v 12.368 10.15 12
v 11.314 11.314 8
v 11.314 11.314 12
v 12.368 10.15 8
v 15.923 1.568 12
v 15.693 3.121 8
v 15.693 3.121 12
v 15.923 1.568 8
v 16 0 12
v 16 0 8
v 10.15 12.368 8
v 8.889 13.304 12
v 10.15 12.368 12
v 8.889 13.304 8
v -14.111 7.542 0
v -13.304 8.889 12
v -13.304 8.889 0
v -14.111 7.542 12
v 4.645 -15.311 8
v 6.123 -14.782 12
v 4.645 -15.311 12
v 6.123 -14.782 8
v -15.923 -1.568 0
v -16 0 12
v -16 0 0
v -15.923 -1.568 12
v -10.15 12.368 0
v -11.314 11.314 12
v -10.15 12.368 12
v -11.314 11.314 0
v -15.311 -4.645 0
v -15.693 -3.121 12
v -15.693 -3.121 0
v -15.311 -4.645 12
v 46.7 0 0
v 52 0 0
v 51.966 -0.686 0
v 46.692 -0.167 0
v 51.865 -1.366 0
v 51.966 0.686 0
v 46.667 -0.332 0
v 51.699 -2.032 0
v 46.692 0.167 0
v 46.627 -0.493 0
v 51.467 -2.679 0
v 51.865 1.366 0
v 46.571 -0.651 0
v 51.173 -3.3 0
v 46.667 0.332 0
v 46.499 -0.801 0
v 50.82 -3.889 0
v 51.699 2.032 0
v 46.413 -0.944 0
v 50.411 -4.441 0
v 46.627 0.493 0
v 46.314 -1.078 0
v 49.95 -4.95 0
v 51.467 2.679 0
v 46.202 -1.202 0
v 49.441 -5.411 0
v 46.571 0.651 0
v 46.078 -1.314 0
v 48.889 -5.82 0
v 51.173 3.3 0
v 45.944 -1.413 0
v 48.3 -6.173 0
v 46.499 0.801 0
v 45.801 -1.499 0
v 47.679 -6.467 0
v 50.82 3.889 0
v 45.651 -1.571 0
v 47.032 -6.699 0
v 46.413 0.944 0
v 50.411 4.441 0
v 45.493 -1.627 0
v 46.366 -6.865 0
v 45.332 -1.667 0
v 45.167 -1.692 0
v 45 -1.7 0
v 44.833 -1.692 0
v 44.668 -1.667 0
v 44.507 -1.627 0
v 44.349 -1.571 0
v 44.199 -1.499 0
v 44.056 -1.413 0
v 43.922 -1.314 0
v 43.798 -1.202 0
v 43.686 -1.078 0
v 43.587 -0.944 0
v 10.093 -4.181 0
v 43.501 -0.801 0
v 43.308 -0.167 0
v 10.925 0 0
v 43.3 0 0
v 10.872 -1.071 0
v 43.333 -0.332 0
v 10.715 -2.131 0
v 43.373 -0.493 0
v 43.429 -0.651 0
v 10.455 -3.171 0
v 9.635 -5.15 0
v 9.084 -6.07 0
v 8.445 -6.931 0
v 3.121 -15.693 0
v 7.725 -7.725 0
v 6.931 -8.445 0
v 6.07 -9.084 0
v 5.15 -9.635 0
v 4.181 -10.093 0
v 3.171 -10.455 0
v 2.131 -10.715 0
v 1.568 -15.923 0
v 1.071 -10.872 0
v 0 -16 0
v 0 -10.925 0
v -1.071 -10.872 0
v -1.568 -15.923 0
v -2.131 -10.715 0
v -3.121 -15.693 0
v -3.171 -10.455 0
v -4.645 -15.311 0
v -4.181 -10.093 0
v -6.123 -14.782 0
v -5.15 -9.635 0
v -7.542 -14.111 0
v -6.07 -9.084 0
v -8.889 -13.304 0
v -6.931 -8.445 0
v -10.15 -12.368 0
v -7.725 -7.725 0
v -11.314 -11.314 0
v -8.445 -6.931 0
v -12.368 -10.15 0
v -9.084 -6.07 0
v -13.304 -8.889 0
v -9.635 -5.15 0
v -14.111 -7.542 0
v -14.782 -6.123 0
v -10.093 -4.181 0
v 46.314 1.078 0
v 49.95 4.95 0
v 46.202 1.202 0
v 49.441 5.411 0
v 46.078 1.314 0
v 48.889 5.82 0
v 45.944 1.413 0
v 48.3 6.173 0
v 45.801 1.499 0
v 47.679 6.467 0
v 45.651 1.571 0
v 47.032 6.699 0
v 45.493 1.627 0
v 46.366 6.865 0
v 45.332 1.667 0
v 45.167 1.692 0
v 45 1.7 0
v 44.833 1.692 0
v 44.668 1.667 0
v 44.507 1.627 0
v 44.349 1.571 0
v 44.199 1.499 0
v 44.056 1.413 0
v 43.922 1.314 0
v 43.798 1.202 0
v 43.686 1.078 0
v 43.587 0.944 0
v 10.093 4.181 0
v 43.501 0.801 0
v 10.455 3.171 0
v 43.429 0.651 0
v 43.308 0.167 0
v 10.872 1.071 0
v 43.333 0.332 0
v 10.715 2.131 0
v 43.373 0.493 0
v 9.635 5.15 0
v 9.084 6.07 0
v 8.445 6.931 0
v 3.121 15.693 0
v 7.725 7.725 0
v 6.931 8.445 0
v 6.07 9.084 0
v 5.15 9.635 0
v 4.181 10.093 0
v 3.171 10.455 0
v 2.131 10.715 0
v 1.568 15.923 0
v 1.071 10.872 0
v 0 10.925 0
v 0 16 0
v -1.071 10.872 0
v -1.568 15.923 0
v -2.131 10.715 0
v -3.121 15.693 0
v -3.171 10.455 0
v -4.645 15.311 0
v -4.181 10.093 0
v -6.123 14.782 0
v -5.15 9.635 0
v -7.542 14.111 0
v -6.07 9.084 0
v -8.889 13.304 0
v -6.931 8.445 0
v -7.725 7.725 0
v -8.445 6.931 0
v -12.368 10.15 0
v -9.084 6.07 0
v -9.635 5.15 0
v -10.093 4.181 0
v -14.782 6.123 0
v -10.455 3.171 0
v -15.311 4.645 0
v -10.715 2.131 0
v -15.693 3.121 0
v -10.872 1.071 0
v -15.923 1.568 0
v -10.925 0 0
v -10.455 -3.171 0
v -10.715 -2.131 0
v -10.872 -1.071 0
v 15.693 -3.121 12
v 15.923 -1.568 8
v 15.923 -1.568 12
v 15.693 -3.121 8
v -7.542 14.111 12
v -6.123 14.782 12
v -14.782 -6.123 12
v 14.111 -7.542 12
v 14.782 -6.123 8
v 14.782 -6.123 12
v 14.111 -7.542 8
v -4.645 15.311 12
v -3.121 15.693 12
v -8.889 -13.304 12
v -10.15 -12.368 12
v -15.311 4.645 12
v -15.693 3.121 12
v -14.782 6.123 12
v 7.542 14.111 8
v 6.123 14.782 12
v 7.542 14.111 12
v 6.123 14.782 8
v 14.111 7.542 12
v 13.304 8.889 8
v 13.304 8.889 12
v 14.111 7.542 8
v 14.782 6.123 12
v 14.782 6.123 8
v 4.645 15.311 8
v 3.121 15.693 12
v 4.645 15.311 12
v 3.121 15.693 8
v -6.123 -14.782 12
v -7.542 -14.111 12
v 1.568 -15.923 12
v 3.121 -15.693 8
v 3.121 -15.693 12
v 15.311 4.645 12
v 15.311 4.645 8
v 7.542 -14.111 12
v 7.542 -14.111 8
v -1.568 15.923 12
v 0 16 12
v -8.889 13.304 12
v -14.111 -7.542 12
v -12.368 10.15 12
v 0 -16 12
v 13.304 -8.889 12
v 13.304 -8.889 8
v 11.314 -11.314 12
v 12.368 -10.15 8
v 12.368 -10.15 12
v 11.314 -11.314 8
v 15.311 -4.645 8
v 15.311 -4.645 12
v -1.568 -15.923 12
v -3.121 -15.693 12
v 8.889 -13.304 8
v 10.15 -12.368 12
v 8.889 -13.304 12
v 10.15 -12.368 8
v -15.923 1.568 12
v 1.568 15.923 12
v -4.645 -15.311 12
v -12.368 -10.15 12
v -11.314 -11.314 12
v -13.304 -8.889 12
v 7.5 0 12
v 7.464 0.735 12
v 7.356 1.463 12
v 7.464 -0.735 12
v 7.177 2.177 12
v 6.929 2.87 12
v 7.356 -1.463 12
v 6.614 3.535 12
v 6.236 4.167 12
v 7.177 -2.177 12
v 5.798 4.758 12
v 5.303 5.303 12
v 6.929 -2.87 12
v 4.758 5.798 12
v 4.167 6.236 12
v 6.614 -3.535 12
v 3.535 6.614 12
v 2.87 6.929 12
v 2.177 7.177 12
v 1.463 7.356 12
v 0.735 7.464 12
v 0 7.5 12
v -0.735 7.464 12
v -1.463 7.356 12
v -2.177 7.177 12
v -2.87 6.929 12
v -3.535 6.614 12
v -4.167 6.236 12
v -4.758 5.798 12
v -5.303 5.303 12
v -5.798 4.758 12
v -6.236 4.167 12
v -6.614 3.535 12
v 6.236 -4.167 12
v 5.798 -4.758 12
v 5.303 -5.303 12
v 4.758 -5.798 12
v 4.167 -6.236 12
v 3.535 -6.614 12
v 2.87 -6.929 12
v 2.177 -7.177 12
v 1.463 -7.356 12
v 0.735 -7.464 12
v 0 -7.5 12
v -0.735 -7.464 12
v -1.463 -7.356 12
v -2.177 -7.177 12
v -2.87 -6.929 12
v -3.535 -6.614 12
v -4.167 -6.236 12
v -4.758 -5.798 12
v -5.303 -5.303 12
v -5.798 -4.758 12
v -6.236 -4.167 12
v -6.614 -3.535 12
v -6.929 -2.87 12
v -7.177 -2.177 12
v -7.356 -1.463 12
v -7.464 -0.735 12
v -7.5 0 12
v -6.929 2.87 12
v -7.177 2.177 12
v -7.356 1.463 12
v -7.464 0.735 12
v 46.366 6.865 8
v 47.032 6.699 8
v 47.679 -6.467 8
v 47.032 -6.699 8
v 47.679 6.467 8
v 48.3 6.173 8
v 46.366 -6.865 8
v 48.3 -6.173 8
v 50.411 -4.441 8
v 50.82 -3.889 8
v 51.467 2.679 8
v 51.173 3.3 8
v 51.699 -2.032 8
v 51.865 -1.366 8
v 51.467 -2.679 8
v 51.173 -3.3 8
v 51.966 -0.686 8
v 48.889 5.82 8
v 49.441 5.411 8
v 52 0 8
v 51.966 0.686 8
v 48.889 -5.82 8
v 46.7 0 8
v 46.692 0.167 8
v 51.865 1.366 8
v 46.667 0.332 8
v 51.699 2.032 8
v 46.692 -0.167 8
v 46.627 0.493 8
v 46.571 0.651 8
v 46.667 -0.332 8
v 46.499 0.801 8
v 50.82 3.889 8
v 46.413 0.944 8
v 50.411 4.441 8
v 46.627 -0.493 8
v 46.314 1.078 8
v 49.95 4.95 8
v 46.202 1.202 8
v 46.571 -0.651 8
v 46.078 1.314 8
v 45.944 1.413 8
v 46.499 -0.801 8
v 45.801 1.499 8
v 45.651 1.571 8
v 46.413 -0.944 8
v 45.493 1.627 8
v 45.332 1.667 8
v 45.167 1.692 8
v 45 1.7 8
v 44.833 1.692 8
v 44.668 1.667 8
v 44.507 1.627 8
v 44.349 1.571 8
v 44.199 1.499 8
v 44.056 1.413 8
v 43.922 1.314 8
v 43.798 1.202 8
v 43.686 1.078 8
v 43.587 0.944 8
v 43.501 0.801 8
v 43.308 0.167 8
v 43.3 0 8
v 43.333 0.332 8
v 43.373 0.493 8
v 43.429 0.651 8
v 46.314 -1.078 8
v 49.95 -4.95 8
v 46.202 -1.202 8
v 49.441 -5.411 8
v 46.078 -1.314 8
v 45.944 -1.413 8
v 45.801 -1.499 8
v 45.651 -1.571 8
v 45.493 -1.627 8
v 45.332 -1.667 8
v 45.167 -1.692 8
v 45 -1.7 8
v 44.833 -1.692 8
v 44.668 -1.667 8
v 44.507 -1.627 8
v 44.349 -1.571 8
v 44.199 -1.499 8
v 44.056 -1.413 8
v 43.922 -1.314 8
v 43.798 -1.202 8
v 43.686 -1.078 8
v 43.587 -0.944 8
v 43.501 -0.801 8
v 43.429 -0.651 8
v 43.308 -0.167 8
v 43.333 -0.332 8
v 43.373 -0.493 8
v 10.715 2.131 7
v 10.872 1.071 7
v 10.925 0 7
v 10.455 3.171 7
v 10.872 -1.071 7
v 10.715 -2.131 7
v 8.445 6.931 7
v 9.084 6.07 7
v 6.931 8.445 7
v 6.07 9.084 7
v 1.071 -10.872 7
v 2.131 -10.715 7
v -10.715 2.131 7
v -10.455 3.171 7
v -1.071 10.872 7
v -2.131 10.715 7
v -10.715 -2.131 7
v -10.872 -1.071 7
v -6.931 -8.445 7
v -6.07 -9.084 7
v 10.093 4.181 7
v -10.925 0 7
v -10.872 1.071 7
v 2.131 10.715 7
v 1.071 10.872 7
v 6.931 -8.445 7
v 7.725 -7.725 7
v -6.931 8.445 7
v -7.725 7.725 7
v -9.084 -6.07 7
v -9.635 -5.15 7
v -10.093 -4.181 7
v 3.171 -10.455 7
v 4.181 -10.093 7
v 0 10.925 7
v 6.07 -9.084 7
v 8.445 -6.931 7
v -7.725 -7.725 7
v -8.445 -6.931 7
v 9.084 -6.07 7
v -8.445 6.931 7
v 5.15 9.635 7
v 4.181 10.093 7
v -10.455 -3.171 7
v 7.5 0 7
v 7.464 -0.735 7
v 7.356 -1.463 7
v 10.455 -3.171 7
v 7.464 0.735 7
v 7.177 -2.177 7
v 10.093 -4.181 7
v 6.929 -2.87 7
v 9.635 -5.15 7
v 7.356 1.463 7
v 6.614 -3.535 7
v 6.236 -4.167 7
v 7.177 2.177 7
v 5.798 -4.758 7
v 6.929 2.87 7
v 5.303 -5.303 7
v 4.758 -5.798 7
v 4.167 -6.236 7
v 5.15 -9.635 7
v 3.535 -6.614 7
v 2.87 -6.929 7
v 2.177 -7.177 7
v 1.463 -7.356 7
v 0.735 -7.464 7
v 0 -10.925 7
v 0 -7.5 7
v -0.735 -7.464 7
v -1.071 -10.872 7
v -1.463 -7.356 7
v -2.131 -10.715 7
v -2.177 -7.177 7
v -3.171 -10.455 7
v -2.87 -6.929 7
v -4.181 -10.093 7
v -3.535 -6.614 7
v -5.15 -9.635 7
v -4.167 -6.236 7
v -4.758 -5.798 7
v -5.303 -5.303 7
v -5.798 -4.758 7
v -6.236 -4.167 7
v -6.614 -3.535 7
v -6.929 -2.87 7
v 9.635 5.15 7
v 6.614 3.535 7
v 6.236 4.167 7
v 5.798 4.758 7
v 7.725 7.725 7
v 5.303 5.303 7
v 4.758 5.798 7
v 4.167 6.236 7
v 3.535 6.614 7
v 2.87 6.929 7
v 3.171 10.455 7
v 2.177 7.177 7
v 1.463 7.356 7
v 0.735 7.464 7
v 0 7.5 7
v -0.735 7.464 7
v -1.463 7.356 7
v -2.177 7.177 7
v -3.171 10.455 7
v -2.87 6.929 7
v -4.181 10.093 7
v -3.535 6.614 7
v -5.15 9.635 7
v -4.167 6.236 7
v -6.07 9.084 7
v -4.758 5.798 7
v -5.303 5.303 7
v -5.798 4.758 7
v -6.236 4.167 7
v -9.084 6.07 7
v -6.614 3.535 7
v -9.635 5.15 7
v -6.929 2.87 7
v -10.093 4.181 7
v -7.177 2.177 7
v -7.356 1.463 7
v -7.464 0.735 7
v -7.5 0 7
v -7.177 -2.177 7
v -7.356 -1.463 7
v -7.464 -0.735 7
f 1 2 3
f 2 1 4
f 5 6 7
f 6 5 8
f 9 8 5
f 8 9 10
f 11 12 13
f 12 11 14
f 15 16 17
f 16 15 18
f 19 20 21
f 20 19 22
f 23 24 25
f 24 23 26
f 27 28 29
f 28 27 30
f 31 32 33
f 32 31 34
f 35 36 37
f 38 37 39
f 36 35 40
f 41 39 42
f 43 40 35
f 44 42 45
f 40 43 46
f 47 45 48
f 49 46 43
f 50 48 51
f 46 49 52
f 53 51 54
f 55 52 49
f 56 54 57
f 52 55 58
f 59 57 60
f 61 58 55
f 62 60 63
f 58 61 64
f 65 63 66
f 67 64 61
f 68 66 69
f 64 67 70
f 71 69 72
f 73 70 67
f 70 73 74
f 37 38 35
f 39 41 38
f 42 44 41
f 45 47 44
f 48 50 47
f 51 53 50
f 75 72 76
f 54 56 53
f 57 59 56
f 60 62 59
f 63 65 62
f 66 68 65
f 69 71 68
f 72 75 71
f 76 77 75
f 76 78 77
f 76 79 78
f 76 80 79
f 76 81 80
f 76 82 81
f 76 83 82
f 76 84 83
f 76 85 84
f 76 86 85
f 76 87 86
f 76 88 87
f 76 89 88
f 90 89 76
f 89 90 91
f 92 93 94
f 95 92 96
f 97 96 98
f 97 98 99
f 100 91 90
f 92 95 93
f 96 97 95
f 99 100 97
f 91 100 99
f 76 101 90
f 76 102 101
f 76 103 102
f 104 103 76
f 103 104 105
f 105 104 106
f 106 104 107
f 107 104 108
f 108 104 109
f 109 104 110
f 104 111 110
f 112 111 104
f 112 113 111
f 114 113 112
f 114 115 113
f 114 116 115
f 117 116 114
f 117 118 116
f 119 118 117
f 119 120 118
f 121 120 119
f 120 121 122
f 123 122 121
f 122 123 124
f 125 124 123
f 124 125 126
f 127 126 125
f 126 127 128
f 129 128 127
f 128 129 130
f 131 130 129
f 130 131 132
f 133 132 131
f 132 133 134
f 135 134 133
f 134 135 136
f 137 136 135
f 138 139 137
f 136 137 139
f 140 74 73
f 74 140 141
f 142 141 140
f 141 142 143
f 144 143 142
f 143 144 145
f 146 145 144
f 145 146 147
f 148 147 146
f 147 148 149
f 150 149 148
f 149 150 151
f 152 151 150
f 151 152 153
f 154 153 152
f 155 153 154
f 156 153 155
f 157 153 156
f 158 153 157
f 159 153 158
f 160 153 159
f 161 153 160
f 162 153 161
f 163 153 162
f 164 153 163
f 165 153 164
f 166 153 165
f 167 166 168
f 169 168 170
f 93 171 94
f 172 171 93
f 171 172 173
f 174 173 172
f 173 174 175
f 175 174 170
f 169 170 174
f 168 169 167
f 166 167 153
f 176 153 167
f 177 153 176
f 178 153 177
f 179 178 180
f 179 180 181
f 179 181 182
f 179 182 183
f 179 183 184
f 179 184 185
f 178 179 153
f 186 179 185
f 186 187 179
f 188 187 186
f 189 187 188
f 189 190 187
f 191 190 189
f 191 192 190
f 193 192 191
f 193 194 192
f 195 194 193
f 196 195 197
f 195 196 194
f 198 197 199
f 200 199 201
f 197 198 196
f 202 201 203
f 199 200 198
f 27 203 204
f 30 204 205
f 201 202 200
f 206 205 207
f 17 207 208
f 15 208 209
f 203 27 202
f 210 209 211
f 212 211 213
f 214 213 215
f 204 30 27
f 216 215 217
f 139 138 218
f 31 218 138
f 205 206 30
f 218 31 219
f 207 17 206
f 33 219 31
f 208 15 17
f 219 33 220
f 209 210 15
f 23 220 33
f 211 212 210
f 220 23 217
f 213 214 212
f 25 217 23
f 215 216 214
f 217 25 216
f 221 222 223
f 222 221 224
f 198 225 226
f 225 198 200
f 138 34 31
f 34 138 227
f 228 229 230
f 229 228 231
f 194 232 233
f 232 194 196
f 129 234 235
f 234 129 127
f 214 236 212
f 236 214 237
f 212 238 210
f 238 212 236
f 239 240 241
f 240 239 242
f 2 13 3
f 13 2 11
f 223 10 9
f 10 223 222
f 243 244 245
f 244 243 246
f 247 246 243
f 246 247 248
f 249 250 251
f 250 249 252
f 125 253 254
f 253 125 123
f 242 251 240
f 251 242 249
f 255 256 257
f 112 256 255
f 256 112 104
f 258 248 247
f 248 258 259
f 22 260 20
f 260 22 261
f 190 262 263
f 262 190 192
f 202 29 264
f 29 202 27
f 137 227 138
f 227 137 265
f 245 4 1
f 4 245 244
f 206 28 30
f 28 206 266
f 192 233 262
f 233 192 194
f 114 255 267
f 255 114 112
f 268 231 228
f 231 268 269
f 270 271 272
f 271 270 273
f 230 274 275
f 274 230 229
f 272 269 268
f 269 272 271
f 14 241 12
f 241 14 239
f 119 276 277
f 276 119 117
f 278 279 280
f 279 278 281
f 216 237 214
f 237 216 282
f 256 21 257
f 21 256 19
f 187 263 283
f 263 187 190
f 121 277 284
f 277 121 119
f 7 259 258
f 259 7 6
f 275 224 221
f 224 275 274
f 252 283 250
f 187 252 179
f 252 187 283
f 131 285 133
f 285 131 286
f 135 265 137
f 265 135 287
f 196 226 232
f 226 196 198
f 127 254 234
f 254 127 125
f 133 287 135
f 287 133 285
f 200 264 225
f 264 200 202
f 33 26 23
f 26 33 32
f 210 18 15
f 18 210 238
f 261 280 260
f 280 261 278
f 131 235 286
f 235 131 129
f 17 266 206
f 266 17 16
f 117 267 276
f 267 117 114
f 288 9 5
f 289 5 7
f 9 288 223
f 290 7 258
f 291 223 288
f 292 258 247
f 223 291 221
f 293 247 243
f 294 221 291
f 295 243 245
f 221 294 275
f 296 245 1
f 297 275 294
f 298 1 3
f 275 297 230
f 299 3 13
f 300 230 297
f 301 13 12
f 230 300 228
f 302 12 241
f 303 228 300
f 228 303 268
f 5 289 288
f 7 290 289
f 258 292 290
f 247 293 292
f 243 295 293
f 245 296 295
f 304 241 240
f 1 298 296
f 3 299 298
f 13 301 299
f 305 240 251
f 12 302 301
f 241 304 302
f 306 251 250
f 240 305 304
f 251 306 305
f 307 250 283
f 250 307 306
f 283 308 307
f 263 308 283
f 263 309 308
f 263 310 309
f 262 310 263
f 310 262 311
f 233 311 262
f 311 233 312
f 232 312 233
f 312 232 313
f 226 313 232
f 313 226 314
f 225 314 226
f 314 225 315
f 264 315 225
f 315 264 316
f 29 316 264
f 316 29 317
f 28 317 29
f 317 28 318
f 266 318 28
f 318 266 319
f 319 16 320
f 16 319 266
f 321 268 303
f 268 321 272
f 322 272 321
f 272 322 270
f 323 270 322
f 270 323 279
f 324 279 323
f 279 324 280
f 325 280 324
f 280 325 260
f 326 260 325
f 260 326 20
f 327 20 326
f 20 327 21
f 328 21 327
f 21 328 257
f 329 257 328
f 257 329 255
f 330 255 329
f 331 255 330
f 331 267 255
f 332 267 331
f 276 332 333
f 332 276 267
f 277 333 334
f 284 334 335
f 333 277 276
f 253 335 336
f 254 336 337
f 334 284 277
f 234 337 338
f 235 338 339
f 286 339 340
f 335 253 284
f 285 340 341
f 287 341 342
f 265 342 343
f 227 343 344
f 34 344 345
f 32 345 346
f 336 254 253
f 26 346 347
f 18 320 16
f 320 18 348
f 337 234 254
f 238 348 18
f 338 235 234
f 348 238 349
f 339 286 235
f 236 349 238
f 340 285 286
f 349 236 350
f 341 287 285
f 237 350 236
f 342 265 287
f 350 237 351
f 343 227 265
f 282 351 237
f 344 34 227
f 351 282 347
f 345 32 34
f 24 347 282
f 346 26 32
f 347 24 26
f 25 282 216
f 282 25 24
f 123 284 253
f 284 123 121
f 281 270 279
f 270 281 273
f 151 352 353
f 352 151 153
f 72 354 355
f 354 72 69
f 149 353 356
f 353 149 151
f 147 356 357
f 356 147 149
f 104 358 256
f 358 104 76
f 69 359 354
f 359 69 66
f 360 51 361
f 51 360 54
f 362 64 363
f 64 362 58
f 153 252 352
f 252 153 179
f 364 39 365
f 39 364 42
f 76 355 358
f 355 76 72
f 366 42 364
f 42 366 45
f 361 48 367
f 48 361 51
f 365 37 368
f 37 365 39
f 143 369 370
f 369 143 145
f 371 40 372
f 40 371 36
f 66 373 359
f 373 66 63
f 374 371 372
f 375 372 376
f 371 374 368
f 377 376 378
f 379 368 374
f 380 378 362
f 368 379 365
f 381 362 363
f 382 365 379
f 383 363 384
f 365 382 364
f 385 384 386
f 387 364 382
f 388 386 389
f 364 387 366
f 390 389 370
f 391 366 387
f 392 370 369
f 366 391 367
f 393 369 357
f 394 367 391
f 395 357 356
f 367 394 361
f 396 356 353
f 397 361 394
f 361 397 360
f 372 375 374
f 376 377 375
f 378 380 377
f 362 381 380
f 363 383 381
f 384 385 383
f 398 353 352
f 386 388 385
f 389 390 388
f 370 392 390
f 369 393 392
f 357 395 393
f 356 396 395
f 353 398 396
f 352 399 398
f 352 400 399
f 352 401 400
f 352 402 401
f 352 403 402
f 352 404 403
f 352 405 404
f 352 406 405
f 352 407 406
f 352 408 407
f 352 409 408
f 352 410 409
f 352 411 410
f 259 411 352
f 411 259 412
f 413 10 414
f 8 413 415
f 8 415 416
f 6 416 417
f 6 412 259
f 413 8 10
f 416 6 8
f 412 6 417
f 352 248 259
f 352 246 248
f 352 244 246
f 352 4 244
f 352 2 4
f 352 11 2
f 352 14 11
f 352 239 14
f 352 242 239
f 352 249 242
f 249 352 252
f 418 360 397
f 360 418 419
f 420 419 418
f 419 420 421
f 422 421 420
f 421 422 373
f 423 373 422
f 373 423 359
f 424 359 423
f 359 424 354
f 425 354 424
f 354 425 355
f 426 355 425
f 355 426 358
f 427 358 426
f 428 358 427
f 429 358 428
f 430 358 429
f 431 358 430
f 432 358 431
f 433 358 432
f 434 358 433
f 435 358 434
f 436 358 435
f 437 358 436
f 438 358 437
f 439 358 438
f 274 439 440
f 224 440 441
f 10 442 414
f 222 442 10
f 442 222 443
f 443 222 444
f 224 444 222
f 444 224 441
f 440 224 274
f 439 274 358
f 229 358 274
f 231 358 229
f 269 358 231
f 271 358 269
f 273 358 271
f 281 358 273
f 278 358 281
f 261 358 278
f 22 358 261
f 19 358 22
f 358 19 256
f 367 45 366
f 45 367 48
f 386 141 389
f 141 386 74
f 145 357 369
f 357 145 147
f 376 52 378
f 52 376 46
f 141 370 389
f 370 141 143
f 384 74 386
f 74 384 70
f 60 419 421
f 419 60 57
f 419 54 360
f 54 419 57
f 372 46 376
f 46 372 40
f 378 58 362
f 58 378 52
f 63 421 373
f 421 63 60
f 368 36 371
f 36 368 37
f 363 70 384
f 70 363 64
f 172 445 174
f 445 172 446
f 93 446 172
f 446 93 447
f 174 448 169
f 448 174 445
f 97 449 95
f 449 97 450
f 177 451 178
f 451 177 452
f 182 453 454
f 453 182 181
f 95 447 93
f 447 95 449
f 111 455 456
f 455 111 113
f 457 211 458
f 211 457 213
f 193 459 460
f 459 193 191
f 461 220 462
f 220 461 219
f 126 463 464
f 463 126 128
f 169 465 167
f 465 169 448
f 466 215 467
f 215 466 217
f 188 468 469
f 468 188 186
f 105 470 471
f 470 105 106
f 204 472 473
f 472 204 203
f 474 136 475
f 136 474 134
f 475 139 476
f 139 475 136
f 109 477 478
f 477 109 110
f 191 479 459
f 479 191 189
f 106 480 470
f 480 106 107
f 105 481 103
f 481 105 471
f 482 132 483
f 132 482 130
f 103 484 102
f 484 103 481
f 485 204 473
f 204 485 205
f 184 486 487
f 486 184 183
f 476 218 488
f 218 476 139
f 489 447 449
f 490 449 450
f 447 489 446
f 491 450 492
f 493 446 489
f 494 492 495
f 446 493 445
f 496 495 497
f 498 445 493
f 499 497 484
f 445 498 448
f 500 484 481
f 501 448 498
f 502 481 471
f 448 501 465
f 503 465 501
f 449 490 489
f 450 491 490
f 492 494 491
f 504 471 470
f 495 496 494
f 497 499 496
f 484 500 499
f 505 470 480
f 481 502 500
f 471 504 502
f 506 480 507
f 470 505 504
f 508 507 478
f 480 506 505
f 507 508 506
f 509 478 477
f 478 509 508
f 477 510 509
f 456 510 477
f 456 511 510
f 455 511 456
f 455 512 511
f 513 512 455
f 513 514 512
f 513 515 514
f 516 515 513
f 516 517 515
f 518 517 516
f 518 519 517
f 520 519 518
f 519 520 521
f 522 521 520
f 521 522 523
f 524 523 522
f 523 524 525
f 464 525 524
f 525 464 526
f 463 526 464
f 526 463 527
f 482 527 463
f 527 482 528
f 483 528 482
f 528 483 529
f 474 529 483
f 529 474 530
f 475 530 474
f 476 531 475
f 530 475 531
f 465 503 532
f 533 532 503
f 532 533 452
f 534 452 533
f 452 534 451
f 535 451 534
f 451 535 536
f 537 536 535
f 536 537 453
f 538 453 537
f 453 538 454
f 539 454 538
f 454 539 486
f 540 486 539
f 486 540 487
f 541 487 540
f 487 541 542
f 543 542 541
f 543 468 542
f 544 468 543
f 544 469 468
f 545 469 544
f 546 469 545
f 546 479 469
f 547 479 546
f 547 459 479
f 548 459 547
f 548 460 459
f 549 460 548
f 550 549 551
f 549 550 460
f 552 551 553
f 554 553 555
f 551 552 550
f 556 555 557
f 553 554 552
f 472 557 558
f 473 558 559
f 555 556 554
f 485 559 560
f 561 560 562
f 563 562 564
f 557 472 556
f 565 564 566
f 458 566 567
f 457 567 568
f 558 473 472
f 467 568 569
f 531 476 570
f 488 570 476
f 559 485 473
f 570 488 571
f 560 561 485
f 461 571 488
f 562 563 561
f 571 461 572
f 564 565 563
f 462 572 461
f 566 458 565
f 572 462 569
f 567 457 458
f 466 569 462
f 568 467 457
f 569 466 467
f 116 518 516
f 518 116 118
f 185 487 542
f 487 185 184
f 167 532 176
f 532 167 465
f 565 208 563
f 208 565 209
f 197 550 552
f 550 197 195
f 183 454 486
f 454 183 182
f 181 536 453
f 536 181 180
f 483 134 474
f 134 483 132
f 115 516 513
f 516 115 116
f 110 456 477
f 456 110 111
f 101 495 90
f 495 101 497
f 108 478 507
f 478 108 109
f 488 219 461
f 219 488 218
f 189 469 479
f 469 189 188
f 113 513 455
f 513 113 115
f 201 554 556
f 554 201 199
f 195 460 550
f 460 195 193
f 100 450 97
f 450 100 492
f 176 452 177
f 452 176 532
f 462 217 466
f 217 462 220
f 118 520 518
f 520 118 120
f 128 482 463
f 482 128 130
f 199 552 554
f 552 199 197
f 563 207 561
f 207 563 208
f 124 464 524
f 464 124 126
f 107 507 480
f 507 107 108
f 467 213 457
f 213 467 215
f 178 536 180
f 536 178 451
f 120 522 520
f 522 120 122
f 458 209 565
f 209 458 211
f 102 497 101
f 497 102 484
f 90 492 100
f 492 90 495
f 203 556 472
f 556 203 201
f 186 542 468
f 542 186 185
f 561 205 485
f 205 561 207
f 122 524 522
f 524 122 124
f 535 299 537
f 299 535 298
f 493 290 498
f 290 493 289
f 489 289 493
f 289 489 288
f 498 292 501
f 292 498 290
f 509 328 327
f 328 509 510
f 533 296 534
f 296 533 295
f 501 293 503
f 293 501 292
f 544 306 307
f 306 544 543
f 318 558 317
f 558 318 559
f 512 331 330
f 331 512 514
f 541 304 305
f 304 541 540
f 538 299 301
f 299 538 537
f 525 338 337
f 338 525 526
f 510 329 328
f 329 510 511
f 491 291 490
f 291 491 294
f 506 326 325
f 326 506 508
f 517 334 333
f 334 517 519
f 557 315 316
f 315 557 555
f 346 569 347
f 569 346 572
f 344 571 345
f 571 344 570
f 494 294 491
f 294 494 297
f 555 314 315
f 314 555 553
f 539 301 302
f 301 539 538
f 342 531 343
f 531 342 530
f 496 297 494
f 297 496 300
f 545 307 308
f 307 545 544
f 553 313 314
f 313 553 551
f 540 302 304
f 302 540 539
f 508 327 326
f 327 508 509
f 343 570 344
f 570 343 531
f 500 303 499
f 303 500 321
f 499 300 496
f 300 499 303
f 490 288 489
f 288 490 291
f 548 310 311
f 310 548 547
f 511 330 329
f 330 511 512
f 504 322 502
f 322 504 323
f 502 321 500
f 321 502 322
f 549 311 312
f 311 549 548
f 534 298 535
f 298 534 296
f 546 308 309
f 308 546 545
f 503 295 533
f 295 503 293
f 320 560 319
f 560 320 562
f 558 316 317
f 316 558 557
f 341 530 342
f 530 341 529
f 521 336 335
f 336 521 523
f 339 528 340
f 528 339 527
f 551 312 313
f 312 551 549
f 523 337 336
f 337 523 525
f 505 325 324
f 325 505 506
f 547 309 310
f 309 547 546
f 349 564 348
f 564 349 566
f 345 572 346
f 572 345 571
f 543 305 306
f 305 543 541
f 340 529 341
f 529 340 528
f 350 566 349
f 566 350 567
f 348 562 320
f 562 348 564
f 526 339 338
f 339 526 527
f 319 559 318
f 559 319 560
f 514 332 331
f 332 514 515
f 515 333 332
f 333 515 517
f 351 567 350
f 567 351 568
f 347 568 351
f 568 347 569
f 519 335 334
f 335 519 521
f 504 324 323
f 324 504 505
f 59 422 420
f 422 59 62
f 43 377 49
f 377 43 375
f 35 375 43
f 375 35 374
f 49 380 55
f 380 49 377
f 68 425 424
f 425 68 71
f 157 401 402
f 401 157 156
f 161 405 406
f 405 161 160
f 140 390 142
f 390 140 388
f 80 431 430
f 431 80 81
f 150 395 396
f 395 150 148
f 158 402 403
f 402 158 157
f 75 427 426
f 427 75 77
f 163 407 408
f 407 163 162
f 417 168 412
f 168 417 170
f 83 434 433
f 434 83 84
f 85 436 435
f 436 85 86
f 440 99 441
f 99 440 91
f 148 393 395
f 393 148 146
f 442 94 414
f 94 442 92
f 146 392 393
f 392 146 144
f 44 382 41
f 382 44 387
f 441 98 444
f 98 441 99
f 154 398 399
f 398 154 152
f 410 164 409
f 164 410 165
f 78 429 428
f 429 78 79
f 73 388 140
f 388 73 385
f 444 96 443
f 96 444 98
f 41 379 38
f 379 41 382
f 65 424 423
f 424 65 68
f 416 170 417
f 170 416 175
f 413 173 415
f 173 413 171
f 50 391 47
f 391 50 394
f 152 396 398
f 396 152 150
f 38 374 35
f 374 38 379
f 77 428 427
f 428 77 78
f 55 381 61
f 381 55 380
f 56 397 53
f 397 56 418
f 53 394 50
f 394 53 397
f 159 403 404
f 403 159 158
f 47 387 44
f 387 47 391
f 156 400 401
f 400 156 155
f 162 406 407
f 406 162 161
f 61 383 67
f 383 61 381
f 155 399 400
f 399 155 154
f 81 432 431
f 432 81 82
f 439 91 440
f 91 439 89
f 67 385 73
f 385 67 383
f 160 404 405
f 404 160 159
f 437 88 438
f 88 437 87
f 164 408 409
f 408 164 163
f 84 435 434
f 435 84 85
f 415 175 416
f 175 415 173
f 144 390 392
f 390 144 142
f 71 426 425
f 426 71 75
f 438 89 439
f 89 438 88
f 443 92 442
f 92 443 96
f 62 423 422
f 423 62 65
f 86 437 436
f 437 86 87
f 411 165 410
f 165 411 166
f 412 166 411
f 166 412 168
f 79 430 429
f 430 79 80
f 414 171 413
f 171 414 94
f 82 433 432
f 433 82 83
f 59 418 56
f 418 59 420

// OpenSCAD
// file: ../lib/utils.scad
// 공통 모듈 (common modules) — 베어링 시트, 볼트 홀 등
include <../config/parameters.scad>

// 베어링 시트 (bearing seat): 압입 공차 적용 포켓
// brg = [내경, 외경, 폭] (예: BRG_608ZZ)
module bearing_seat(brg) {
    cylinder(d = brg[1] + bearing_press_fit, h = brg[2]);
}

// 베어링 시트 + 내륜 도피 홀 (관통)
// wall = 시트 아래 받침 두께
module bearing_pocket(brg, wall = 2) {
    union() {
        translate([0, 0, wall]) bearing_seat(brg);
        // 내륜 접촉 방지: 내경보다 크고 외경보다 작은 도피 홀
        cylinder(d = (brg[0] + brg[1]) / 2, h = wall + 0.1);
    }
}

// 관통 볼트 홀 (clearance hole)
module bolt_hole(d, h) {
    cylinder(d = d + bolt_hole_oversize, h = h);
}

// NEMA 17 모터 마운트 홀 패턴 (CON-004: SF24 = 42각 NEMA 17 호환)
// h = 판 두께
module nema17_mount(h) {
    union() {
        cylinder(d = nema17_pilot_d + clearance_fit, h = h);
        for (x = [-1, 1], y = [-1, 1])
            translate([x * nema17_hole_pitch / 2, y * nema17_hole_pitch / 2, 0])
                bolt_hole(nema17_bolt_d, h);
    }
}

// 숄더 볼트 피벗 홀 (CON-001)
// d = 숄더 직경 (shoulder_d_small | shoulder_d_large)
module pivot_hole(d, h) {
    cylinder(d = d + clearance_fit, h = h);
}

// 베어링 보스 (bearing boss): 출력물 허브에 베어링 내경 직접 안착 (CON-003)
// 내경 기준 압입 — bearing_press_fit(음수)만큼 키운다
module bearing_boss(brg, h) {
    cylinder(d = brg[0] - bearing_press_fit, h = h);
}

// 육각 너트 포켓 (nut pocket) — 차집합용. af = 평면폭(across flats)
module nut_pocket(af, t) {
    cylinder(d = (af + clearance_fit) / cos(30), h = t, $fn = 6);
}

// 리미트 스위치 장착 홀 쌍 (ELE-004) — 차집합용, X축 방향 피치
module ls_mount_holes(h) {
    for (x = [-1, 1])
        translate([x * ls_hole_pitch / 2, 0, 0])
            cylinder(d = ls_hole_d, h = h);
}

// 케이블 가이드 클립 (ELE-005) — 외면 부착형 C-클립, cable_d 다발 직경
module cable_clip(cable_d = 8, t = 4) {
    wall = 2.5;
    difference() {
        cylinder(d = cable_d + 2 * wall, h = t);
        translate([0, 0, -0.1]) cylinder(d = cable_d, h = t + 0.2);
        // 삽입 개구 (개구 폭 = 케이블 직경의 70%)
        translate([0, -cable_d * 0.35, -0.1])
            cube([cable_d, cable_d * 0.7, t + 0.2]);
    }
}

// 평행/구동 링크 바 (625ZZ 양단, MEC-002/MEC-001a)
// len = 피벗 간 거리. 보스 상면에서 베어링 압입, 하면 내륜 도피 홀.
module link_bar(len) {
    boss_t = BRG_625ZZ[2] + 4;
    difference() {
        union() {
            translate([0, -link_bar_w / 2, (boss_t - link_bar_t) / 2])
                cube([len, link_bar_w, link_bar_t]);
            for (x = [0, len])
                translate([x, 0, 0]) cylinder(d = link_boss_d, h = boss_t);
        }
        for (x = [0, len]) {
            translate([x, 0, boss_t - BRG_625ZZ[2]])
                bearing_seat([BRG_625ZZ[0], BRG_625ZZ[1], BRG_625ZZ[2] + 0.1]);
            translate([x, 0, -0.1])
                cylinder(d = (BRG_625ZZ[0] + BRG_625ZZ[1]) / 2, h = boss_t + 0.2);
        }
    }
}

// 지시선(leader) + 빌보드(billboard) 라벨 — 프리뷰용, $vpr 카메라 추종
// p = 앵커(부품 측), v = 지시선 벡터 (라벨은 p+v 위치)
// 주의: 상위 프레임이 회전된 경우 빌보드가 카메라를 향하지 않음 — 월드 프레임에서 호출할 것
module leader_label(p, v, txt, size = 3.2, col = "white") {
    color(col) {
        hull() {
            translate(p) sphere(d = 1.4, $fn = 12);
            translate(p + v) sphere(d = 1.4, $fn = 12);
        }
        translate(p + v) rotate($vpr) translate([2, -size / 2, 0])
            linear_extrude(0.6) text(txt, size = size);
    }
}

// 축 클램프 슬릿 + M3 핀치 볼트 (차집합용)
// bore_d = 클램프 보어, depth = 보어 깊이, body_d = 보스 외경
module shaft_clamp_cut(bore_d, depth, body_d) {
    union() {
        cylinder(d = bore_d + clearance_fit / 2, h = depth);
        // 슬릿
        translate([-1, 0, -0.1]) cube([2, body_d / 2 + 1, depth + 0.1]);
        // M3 핀치 볼트 (슬릿 직교) — 보어 반경과 보스 반경 사이
        translate([0, (bore_d / 2 + body_d / 2) / 2 + 1, depth / 2])
            rotate([0, 90, 0])
                translate([0, 0, -body_d / 2 - 1])
                    bolt_hole(3, body_d + 2);
    }
}
// file: ../config/parameters.scad
// cobot-lite 전역 파라미터 (global parameters)
// 모든 부품 치수는 이 파일에서만 정의한다 — 매직 넘버 하드코딩 금지 (MEC-008)

/* ===== 출력/렌더링 ===== */
$fn = 64;

/* ===== 공통 가공 여유 (파생 치수에서 참조 — 선행 정의 필수) ===== */
clearance_fit = 0.3;      // 회전/슬라이드 끼움 여유
bolt_hole_oversize = 0.4; // 관통 볼트 홀 여유

/* ===== 베어링 (bearing) — CON-002: 이 4종만 사용 =====
   [내경, 외경, 폭] mm */
BRG_608ZZ  = [8,  22, 7];   // 관절 피벗 (8mm 숄더 볼트)
BRG_625ZZ  = [5,  16, 5];   // 평행 링크 피벗 (5mm 숄더 볼트)
BRG_6805ZZ = [25, 37, 7];   // 손목 롤 축, 중구경 허브
BRG_6810ZZ = [50, 65, 7];   // 베이스 턴테이블 메인 베어링

// 베어링 압입 공차 (press-fit tolerance) — MFG-002
// 외경 기준 -0.1 ~ -0.2mm. 프린터별 보정은 이 변수 하나로 조정한다.
bearing_press_fit = -0.15;

/* ===== 숄더 볼트 (stripper/shoulder bolt) — CON-001 ===== */
shoulder_d_small = 5;   // 625ZZ 결합
shoulder_d_large = 8;   // 608ZZ 결합

/* ===== 링크 길이 — MEC-006 [TBD-4] =====
   리치 500mm 잠정. 비대칭 분할 (J2 자중 부담 보상, MEC-001a 분담 구조) */
L1 = 225;   // 상완 (upper arm): J2 축 → J3 축
L2 = 275;   // 하완 (forearm): J3 축 → 공구 플랜지

/* ===== 링크 꺾임 (팔레타이저식 구조 오프셋) =====
   관절 축 좌표는 불변(직선 L1/L2 기준) — 꺾임은 빔 형상만 변경.
   목적: ① 신장/접힘 한계 자세에서 빔-빔 간섭 여유 확보
        ② 구조 외곽을 축선 위로 올려 저자세 작업 시 팔꿈치 하부 돌출 감소
   니(knee) 수직 오프셋 h = L·pos·(1-pos)·tan(deg) */
ua_bend_deg = 12;     // 상완 꺾임각 (0 = 직선)
ua_bend_pos = 0.68;   // 꺾임 위치 (0~1, J2 기준) — 분할 조인트(95~131) 뒤
fa_bend_deg = 12;     // 하완 꺾임각
fa_bend_pos = 0.5;    // 꺾임 위치 (팔꿈치 기준)

/* ===== 가동 엔벨로프 (소프트 리미트 권고값 — docs/design-notes.md) =====
   접힘각 = J3 - J2 (월드 피치 차).
   -90° = 평행사변형 구동 전동각(transmission angle) 특이점 (크랭크∥링크),
     0° = 완전 신장 특이점 (J2·J3·손목 일직선). 양쪽 모두 운용 금지 */
env_fold_min = -75;   // 접힘 한계 (전동각 sin25° ≈ 0.42 이상 확보)
env_fold_max = -3;    // 신장 한계 (리치 ≈ 499.5mm — 공칭 500 대비 -0.5)

// J3 모터 후방 배치 연장 길이 (MEC-001c)
// J2 액추에이터는 J2 축 동축 직결 (MEC-001b) — 후방 배치 대상은 J3 어셈블리만
// J1 회전 시 베이스·작업물 간섭 확인 필수
rear_extension = 80;    // J2 피벗 → J3 모터+기어박스 어셈블리 중심 [잠정]

/* ===== 턴테이블 (turntable) — MEC-003 ===== */
turntable_bearing_gap = 30;   // 6810ZZ 2개 축방향 이격, 30mm 이상 (SHOULD)

/* ===== 모터 (motor) — CON-004: 산요덴키 SF24 시리즈 =====
   NEMA 17 호환 42각 */
motor_frame = 42;             // 프레임 폭 (mm)
nema17_hole_pitch = 31;       // 고정 볼트 피치
nema17_pilot_d = 22;          // 센터 파일럿 직경
nema17_bolt_d = 3;            // M3

/* ===== 감속비 (gear ratio) — CON-005: 5/10/20만 허용 ===== */
// 주의: MG17-G10(10:1)은 허용 토크 5N·m로 급락 — 변경 시 토크 재검증 (docs/torque-budget.md)
ratio_J1 = 20;
ratio_J2 = 20;
ratio_J3 = 20;   // SF2423 + 20:1 확정 (TBD-3 해결)
ratio_J4 = 5;

/* ===== 기어박스 (gearbox) — MG17 데이터시트 (docs/tbd-research.md TBD-5) ===== */
gbx_frame = 42;            // NEMA 17 플랜지, 모터와 동일 42각
gbx_len_20to1 = 51;        // MG17-G20 길이 (J1~J3)
gbx_len_5to1  = 40;        // MG17-G5 길이 (J4)
gbx_out_shaft_d = 8;       // 출력축 직경
gbx_in_insert = 9.5;       // 입력 결합 깊이 — SF24 축 길이 호환 확인 항목
gbx_mass_20to1 = 400;      // g — 질량 예산 계산용
gbx_mass_5to1  = 350;      // g

/* ===== 모터 몸체 치수 — SF24 카탈로그 일반값 [잠정: 구매 데이터시트로 확인] ===== */
motor_len_SF2424 = 47;    // J1, J2
motor_len_SF2423 = 39;    // J3
motor_len_SF2422 = 33;    // J4
motor_shaft_d = 5;        // SF24 출력축 (MG17 입력 클램프 ⌀5)
gbx_out_shaft_len = 20;   // MG17 출력축 돌출 길이

/* ===== 베이스/J1 (MEC-003, MEC-005) ===== */
base_plate_size = 140;    // 정사각 베이스 플레이트 한 변
base_plate_t = 8;
base_bolt_d = 5;          // M5 ×4 작업대 고정 (MEC-005)
base_bolt_pitch = 120;    // 고정 볼트 피치
base_col_wall = 5;        // 턴테이블 칼럼 벽 두께
col_window_w = 50;        // 칼럼 측면 배선/조립 창 폭
turntable_top_d = 100;    // 턴테이블 상판 직경
turntable_top_t = 8;
j1_actuator_gap = 4;      // 베이스 플레이트 상면 → 모터 하면 여유
col_open_h = 24;          // 모터 플로어 상면 → 하부 베어링 (스템 결합·셋스크류 존)
j1_stem_d = 20;           // 턴테이블 허브 스템(출력축 결합부) 외경
set_screw_pilot_d = 3.4;  // M4 무두 볼트(set screw) 셀프태핑 파일럿
m3_tap_d = 2.8;           // M3 셀프태핑 파일럿 (앵커 등 소형 체결)
shoulder_mount_px = 80;   // 어깨 텅 ↔ 턴테이블 볼트 피치 X
shoulder_mount_py = 50;   // 어깨 텅 ↔ 턴테이블 볼트 피치 Y
shoulder_mount_bolt_d = 5;// M5 ×4
shoulder_tongue_x = 40;   // 어깨 텅 깊이(X) — 포크 내 스윕 간섭 한계 결정 (J2 ≈ ±55°)

/* ===== 암 단면/관절 (MEC-004) — v0.13 플레이트 아키텍처 =====
   원칙: 출력물은 평판(plate)만. 간격은 표준 스페이서 튜브 + 관통 볼트가
   결정 (일체 보스·웹·박스 금지). 관절 베어링은 플레이트에 직접 압입 —
   플레이트 두께 = 608ZZ 폭(7) */
arm_plate_t = 7;          // 측판 두께 = 608ZZ 폭 (베어링 인-플레이트 압입)
fork_standoff_len = 30;   // 표준 육각 스탠드오프 길이 (어깨 포크 갭 = 하완 내폭)
hex_standoff_af = 13;     // 두꺼운 육각 스탠드오프 평면폭 (M6 암-암)
joint_spacer_od = 12;     // 관절 스택 스페이서 튜브 외경 (숄더 ⌀8 위)
ua_split_x = 115;         // 상완 플레이트 분할선 (365 > 빌드 대각 한계)
ua_splice = [99, 131];    // 스플라이스 더블러 볼트 X 위치 (분할선 ±16)
// 어깨 텅(플레이트 스택) 폭 = 플레이트 14 ×2 + 표준 스탠드오프 30 (v0.13)
tongue_w = 28 + fork_standoff_len;          // 58
// 상완 포크 내폭 = 표준 육각 스탠드오프 L60 (전 스탠드오프 표준화 — v0.14).
// 텅 58과의 편차 1mm/측은 J2 스택 M8 와셔가 흡수 (CON-001 와셔 기존 품목)
arm_inner_w = 60;
arm_h = 50;               // 암 단면 높이
j2_axis_h = 90;           // 턴테이블 상면 → J2 축 높이
                          // — J2 +45° 시 후방 러그 하단 ↔ 어깨 플랜지 간섭 회피 (간섭 검사 확인)
j3_crank_len = 40;        // J3 크랭크 = 하완 혼 반경 (평행사변형 1:1)
pl_offset = 45;           // 수동 평행사변형(MEC-002) 피벗 오프셋
                          // — J2 모터 42각 코너 스윕 반경(≈30) + 여유
forearm_inner_w = fork_standoff_len;  // 하완 측판 내폭 = 표준 스탠드오프 30 (v0.13)
beam_w = 40;              // 상완/하완 중앙 보(beam) 폭
arm_lug_r = 26;           // 관절 러그(피벗 보스) 반경 — NEMA17 볼트 코너(r≈21.9) + 벽
beam_wall = 4;            // 보 쉘 벽 두께 (경량화)
pivot_engage = 14;        // 축 클램프/베어링 물림 깊이
crank_t = 8;              // J3 크랭크 암 두께
crank_hub_d = 20;         // 크랭크 허브 외경
crank_hub_w = 12;         // 크랭크 허브 폭
dl_offset = 8;            // 구동 링크 평면: 플레이트 A 외면 → 링크 중심 거리
ua_joint_x = 95;          // 상완 분할 조인트 위치 (MFG-004: 365mm > 빌드 대각 한계)
ua_lap = 36;              // 랩 조인트(소켓-테논) 물림 길이

/* ===== 너트 평면폭 (across flats) ===== */
m3_nut_af = 5.5;
m4_nut_af = 7;
m6_nut_af = 10;
link_bar_w = 12;          // 링크 바 단면 폭
link_bar_t = 6;           // 링크 바 단면 두께
link_boss_d = 24;         // 링크 단부 625ZZ 보스 외경 (625 외경 16 + 벽 4×2)

/* ===== 손목/공구 플랜지 (GEN-004) ===== */
wrist_offset = 50;        // 손목 피치 피벗 → J4(플랜지) 축 수평 오프셋
                          // — J4 모터 몸체 ↔ 하완 러그 스윕 간섭 회피 (≥ lug_r + 모터 반폭)
forearm_len = L2 - wrist_offset; // 팔꿈치 축 → 손목 피치 피벗
wrist_wall = 5;           // 손목 하우징 벽 두께
flange_d = 45;            // 공구 플랜지 직경
flange_t = 8;
flange_bc = 32;           // 그리퍼 볼트 서클
flange_bolt_d = 4;        // M4 ×4

/* ===== 리미트 스위치 (ELE-004) — KW12형 기계식 마이크로 기준품 ===== */
ls_body = [20, 10, 6.5];  // 몸체 [길이, 높이, 두께]
ls_hole_pitch = 9.5;      // 장착 홀 피치
ls_hole_d = 2.3;          // M2 셀프태핑/볼트

/* ===== 질량 산출 (MEC-007, docs/mass-budget.md) ===== */
petgcf_density = 1.30;    // g/cm³ (PETG-CF 카탈로그 일반값)
print_solidity = 0.6;     // 쉘+인필 유효 충전율 [잠정 — 슬라이서 추정으로 대체]
motor_mass_SF2424 = 510;  // g (산요 카탈로그 확정)
motor_mass_SF2423 = 380;
motor_mass_SF2422 = 300;

/* ===== 질량/성능 예산 ===== */
payload = 1.0;            // kg, 그리퍼 포함 정격 (PER-001)
moving_mass_budget = 0.8; // kg, 상완 이후 이동부 상한 (MEC-007)

/* ===== 출력 제약 — MFG-004 (Creality SparkX i7, TBD-8 해결) ===== */
build_volume = [260, 260, 255];
// main file
// 팔꿈치 로커 (elbow rocker) — 수동 평행사변형 스테이지 1↔2 중계 (MEC-002)
// 팔꿈치 8mm 숄더 볼트 +Y 연장부에 608ZZ로 자유 회전 (CON-001/002).
// 핀(반경 pl_offset)에 링크 1·2 베어링을 동일 5mm 숄더 볼트로 적층.
// 좌표: 허브 축 = Z (조립 시 +Y), 핀 = +X 방향.
include <../config/parameters.scad>
use <../lib/utils.scad>

hub_w = BRG_608ZZ[2] + 5;   // 608 포켓 + 도피 웹

module rocker() {
    difference() {
        union() {
            cylinder(d = BRG_608ZZ[1] + 10, h = hub_w);            // 허브
            hull() {                                                // 암
                cylinder(d = BRG_608ZZ[1] + 10, h = crank_t);
                translate([pl_offset, 0, 0]) cylinder(d = 14, h = crank_t);
            }
        }
        // 608ZZ 포켓 (z0 면 = 조립 시 -Y측) + 내륜 도피
        translate([0, 0, -0.1])
            bearing_seat([BRG_608ZZ[0], BRG_608ZZ[1], BRG_608ZZ[2] + 0.1]);
        translate([0, 0, -0.1])
            cylinder(d = (BRG_608ZZ[0] + BRG_608ZZ[1]) / 2, h = hub_w + 0.2);
        // 링크 핀: M4 파일럿
        translate([pl_offset, 0, -0.1])
            cylinder(d = set_screw_pilot_d, h = crank_t + 0.2);
    }
}

rocker();
